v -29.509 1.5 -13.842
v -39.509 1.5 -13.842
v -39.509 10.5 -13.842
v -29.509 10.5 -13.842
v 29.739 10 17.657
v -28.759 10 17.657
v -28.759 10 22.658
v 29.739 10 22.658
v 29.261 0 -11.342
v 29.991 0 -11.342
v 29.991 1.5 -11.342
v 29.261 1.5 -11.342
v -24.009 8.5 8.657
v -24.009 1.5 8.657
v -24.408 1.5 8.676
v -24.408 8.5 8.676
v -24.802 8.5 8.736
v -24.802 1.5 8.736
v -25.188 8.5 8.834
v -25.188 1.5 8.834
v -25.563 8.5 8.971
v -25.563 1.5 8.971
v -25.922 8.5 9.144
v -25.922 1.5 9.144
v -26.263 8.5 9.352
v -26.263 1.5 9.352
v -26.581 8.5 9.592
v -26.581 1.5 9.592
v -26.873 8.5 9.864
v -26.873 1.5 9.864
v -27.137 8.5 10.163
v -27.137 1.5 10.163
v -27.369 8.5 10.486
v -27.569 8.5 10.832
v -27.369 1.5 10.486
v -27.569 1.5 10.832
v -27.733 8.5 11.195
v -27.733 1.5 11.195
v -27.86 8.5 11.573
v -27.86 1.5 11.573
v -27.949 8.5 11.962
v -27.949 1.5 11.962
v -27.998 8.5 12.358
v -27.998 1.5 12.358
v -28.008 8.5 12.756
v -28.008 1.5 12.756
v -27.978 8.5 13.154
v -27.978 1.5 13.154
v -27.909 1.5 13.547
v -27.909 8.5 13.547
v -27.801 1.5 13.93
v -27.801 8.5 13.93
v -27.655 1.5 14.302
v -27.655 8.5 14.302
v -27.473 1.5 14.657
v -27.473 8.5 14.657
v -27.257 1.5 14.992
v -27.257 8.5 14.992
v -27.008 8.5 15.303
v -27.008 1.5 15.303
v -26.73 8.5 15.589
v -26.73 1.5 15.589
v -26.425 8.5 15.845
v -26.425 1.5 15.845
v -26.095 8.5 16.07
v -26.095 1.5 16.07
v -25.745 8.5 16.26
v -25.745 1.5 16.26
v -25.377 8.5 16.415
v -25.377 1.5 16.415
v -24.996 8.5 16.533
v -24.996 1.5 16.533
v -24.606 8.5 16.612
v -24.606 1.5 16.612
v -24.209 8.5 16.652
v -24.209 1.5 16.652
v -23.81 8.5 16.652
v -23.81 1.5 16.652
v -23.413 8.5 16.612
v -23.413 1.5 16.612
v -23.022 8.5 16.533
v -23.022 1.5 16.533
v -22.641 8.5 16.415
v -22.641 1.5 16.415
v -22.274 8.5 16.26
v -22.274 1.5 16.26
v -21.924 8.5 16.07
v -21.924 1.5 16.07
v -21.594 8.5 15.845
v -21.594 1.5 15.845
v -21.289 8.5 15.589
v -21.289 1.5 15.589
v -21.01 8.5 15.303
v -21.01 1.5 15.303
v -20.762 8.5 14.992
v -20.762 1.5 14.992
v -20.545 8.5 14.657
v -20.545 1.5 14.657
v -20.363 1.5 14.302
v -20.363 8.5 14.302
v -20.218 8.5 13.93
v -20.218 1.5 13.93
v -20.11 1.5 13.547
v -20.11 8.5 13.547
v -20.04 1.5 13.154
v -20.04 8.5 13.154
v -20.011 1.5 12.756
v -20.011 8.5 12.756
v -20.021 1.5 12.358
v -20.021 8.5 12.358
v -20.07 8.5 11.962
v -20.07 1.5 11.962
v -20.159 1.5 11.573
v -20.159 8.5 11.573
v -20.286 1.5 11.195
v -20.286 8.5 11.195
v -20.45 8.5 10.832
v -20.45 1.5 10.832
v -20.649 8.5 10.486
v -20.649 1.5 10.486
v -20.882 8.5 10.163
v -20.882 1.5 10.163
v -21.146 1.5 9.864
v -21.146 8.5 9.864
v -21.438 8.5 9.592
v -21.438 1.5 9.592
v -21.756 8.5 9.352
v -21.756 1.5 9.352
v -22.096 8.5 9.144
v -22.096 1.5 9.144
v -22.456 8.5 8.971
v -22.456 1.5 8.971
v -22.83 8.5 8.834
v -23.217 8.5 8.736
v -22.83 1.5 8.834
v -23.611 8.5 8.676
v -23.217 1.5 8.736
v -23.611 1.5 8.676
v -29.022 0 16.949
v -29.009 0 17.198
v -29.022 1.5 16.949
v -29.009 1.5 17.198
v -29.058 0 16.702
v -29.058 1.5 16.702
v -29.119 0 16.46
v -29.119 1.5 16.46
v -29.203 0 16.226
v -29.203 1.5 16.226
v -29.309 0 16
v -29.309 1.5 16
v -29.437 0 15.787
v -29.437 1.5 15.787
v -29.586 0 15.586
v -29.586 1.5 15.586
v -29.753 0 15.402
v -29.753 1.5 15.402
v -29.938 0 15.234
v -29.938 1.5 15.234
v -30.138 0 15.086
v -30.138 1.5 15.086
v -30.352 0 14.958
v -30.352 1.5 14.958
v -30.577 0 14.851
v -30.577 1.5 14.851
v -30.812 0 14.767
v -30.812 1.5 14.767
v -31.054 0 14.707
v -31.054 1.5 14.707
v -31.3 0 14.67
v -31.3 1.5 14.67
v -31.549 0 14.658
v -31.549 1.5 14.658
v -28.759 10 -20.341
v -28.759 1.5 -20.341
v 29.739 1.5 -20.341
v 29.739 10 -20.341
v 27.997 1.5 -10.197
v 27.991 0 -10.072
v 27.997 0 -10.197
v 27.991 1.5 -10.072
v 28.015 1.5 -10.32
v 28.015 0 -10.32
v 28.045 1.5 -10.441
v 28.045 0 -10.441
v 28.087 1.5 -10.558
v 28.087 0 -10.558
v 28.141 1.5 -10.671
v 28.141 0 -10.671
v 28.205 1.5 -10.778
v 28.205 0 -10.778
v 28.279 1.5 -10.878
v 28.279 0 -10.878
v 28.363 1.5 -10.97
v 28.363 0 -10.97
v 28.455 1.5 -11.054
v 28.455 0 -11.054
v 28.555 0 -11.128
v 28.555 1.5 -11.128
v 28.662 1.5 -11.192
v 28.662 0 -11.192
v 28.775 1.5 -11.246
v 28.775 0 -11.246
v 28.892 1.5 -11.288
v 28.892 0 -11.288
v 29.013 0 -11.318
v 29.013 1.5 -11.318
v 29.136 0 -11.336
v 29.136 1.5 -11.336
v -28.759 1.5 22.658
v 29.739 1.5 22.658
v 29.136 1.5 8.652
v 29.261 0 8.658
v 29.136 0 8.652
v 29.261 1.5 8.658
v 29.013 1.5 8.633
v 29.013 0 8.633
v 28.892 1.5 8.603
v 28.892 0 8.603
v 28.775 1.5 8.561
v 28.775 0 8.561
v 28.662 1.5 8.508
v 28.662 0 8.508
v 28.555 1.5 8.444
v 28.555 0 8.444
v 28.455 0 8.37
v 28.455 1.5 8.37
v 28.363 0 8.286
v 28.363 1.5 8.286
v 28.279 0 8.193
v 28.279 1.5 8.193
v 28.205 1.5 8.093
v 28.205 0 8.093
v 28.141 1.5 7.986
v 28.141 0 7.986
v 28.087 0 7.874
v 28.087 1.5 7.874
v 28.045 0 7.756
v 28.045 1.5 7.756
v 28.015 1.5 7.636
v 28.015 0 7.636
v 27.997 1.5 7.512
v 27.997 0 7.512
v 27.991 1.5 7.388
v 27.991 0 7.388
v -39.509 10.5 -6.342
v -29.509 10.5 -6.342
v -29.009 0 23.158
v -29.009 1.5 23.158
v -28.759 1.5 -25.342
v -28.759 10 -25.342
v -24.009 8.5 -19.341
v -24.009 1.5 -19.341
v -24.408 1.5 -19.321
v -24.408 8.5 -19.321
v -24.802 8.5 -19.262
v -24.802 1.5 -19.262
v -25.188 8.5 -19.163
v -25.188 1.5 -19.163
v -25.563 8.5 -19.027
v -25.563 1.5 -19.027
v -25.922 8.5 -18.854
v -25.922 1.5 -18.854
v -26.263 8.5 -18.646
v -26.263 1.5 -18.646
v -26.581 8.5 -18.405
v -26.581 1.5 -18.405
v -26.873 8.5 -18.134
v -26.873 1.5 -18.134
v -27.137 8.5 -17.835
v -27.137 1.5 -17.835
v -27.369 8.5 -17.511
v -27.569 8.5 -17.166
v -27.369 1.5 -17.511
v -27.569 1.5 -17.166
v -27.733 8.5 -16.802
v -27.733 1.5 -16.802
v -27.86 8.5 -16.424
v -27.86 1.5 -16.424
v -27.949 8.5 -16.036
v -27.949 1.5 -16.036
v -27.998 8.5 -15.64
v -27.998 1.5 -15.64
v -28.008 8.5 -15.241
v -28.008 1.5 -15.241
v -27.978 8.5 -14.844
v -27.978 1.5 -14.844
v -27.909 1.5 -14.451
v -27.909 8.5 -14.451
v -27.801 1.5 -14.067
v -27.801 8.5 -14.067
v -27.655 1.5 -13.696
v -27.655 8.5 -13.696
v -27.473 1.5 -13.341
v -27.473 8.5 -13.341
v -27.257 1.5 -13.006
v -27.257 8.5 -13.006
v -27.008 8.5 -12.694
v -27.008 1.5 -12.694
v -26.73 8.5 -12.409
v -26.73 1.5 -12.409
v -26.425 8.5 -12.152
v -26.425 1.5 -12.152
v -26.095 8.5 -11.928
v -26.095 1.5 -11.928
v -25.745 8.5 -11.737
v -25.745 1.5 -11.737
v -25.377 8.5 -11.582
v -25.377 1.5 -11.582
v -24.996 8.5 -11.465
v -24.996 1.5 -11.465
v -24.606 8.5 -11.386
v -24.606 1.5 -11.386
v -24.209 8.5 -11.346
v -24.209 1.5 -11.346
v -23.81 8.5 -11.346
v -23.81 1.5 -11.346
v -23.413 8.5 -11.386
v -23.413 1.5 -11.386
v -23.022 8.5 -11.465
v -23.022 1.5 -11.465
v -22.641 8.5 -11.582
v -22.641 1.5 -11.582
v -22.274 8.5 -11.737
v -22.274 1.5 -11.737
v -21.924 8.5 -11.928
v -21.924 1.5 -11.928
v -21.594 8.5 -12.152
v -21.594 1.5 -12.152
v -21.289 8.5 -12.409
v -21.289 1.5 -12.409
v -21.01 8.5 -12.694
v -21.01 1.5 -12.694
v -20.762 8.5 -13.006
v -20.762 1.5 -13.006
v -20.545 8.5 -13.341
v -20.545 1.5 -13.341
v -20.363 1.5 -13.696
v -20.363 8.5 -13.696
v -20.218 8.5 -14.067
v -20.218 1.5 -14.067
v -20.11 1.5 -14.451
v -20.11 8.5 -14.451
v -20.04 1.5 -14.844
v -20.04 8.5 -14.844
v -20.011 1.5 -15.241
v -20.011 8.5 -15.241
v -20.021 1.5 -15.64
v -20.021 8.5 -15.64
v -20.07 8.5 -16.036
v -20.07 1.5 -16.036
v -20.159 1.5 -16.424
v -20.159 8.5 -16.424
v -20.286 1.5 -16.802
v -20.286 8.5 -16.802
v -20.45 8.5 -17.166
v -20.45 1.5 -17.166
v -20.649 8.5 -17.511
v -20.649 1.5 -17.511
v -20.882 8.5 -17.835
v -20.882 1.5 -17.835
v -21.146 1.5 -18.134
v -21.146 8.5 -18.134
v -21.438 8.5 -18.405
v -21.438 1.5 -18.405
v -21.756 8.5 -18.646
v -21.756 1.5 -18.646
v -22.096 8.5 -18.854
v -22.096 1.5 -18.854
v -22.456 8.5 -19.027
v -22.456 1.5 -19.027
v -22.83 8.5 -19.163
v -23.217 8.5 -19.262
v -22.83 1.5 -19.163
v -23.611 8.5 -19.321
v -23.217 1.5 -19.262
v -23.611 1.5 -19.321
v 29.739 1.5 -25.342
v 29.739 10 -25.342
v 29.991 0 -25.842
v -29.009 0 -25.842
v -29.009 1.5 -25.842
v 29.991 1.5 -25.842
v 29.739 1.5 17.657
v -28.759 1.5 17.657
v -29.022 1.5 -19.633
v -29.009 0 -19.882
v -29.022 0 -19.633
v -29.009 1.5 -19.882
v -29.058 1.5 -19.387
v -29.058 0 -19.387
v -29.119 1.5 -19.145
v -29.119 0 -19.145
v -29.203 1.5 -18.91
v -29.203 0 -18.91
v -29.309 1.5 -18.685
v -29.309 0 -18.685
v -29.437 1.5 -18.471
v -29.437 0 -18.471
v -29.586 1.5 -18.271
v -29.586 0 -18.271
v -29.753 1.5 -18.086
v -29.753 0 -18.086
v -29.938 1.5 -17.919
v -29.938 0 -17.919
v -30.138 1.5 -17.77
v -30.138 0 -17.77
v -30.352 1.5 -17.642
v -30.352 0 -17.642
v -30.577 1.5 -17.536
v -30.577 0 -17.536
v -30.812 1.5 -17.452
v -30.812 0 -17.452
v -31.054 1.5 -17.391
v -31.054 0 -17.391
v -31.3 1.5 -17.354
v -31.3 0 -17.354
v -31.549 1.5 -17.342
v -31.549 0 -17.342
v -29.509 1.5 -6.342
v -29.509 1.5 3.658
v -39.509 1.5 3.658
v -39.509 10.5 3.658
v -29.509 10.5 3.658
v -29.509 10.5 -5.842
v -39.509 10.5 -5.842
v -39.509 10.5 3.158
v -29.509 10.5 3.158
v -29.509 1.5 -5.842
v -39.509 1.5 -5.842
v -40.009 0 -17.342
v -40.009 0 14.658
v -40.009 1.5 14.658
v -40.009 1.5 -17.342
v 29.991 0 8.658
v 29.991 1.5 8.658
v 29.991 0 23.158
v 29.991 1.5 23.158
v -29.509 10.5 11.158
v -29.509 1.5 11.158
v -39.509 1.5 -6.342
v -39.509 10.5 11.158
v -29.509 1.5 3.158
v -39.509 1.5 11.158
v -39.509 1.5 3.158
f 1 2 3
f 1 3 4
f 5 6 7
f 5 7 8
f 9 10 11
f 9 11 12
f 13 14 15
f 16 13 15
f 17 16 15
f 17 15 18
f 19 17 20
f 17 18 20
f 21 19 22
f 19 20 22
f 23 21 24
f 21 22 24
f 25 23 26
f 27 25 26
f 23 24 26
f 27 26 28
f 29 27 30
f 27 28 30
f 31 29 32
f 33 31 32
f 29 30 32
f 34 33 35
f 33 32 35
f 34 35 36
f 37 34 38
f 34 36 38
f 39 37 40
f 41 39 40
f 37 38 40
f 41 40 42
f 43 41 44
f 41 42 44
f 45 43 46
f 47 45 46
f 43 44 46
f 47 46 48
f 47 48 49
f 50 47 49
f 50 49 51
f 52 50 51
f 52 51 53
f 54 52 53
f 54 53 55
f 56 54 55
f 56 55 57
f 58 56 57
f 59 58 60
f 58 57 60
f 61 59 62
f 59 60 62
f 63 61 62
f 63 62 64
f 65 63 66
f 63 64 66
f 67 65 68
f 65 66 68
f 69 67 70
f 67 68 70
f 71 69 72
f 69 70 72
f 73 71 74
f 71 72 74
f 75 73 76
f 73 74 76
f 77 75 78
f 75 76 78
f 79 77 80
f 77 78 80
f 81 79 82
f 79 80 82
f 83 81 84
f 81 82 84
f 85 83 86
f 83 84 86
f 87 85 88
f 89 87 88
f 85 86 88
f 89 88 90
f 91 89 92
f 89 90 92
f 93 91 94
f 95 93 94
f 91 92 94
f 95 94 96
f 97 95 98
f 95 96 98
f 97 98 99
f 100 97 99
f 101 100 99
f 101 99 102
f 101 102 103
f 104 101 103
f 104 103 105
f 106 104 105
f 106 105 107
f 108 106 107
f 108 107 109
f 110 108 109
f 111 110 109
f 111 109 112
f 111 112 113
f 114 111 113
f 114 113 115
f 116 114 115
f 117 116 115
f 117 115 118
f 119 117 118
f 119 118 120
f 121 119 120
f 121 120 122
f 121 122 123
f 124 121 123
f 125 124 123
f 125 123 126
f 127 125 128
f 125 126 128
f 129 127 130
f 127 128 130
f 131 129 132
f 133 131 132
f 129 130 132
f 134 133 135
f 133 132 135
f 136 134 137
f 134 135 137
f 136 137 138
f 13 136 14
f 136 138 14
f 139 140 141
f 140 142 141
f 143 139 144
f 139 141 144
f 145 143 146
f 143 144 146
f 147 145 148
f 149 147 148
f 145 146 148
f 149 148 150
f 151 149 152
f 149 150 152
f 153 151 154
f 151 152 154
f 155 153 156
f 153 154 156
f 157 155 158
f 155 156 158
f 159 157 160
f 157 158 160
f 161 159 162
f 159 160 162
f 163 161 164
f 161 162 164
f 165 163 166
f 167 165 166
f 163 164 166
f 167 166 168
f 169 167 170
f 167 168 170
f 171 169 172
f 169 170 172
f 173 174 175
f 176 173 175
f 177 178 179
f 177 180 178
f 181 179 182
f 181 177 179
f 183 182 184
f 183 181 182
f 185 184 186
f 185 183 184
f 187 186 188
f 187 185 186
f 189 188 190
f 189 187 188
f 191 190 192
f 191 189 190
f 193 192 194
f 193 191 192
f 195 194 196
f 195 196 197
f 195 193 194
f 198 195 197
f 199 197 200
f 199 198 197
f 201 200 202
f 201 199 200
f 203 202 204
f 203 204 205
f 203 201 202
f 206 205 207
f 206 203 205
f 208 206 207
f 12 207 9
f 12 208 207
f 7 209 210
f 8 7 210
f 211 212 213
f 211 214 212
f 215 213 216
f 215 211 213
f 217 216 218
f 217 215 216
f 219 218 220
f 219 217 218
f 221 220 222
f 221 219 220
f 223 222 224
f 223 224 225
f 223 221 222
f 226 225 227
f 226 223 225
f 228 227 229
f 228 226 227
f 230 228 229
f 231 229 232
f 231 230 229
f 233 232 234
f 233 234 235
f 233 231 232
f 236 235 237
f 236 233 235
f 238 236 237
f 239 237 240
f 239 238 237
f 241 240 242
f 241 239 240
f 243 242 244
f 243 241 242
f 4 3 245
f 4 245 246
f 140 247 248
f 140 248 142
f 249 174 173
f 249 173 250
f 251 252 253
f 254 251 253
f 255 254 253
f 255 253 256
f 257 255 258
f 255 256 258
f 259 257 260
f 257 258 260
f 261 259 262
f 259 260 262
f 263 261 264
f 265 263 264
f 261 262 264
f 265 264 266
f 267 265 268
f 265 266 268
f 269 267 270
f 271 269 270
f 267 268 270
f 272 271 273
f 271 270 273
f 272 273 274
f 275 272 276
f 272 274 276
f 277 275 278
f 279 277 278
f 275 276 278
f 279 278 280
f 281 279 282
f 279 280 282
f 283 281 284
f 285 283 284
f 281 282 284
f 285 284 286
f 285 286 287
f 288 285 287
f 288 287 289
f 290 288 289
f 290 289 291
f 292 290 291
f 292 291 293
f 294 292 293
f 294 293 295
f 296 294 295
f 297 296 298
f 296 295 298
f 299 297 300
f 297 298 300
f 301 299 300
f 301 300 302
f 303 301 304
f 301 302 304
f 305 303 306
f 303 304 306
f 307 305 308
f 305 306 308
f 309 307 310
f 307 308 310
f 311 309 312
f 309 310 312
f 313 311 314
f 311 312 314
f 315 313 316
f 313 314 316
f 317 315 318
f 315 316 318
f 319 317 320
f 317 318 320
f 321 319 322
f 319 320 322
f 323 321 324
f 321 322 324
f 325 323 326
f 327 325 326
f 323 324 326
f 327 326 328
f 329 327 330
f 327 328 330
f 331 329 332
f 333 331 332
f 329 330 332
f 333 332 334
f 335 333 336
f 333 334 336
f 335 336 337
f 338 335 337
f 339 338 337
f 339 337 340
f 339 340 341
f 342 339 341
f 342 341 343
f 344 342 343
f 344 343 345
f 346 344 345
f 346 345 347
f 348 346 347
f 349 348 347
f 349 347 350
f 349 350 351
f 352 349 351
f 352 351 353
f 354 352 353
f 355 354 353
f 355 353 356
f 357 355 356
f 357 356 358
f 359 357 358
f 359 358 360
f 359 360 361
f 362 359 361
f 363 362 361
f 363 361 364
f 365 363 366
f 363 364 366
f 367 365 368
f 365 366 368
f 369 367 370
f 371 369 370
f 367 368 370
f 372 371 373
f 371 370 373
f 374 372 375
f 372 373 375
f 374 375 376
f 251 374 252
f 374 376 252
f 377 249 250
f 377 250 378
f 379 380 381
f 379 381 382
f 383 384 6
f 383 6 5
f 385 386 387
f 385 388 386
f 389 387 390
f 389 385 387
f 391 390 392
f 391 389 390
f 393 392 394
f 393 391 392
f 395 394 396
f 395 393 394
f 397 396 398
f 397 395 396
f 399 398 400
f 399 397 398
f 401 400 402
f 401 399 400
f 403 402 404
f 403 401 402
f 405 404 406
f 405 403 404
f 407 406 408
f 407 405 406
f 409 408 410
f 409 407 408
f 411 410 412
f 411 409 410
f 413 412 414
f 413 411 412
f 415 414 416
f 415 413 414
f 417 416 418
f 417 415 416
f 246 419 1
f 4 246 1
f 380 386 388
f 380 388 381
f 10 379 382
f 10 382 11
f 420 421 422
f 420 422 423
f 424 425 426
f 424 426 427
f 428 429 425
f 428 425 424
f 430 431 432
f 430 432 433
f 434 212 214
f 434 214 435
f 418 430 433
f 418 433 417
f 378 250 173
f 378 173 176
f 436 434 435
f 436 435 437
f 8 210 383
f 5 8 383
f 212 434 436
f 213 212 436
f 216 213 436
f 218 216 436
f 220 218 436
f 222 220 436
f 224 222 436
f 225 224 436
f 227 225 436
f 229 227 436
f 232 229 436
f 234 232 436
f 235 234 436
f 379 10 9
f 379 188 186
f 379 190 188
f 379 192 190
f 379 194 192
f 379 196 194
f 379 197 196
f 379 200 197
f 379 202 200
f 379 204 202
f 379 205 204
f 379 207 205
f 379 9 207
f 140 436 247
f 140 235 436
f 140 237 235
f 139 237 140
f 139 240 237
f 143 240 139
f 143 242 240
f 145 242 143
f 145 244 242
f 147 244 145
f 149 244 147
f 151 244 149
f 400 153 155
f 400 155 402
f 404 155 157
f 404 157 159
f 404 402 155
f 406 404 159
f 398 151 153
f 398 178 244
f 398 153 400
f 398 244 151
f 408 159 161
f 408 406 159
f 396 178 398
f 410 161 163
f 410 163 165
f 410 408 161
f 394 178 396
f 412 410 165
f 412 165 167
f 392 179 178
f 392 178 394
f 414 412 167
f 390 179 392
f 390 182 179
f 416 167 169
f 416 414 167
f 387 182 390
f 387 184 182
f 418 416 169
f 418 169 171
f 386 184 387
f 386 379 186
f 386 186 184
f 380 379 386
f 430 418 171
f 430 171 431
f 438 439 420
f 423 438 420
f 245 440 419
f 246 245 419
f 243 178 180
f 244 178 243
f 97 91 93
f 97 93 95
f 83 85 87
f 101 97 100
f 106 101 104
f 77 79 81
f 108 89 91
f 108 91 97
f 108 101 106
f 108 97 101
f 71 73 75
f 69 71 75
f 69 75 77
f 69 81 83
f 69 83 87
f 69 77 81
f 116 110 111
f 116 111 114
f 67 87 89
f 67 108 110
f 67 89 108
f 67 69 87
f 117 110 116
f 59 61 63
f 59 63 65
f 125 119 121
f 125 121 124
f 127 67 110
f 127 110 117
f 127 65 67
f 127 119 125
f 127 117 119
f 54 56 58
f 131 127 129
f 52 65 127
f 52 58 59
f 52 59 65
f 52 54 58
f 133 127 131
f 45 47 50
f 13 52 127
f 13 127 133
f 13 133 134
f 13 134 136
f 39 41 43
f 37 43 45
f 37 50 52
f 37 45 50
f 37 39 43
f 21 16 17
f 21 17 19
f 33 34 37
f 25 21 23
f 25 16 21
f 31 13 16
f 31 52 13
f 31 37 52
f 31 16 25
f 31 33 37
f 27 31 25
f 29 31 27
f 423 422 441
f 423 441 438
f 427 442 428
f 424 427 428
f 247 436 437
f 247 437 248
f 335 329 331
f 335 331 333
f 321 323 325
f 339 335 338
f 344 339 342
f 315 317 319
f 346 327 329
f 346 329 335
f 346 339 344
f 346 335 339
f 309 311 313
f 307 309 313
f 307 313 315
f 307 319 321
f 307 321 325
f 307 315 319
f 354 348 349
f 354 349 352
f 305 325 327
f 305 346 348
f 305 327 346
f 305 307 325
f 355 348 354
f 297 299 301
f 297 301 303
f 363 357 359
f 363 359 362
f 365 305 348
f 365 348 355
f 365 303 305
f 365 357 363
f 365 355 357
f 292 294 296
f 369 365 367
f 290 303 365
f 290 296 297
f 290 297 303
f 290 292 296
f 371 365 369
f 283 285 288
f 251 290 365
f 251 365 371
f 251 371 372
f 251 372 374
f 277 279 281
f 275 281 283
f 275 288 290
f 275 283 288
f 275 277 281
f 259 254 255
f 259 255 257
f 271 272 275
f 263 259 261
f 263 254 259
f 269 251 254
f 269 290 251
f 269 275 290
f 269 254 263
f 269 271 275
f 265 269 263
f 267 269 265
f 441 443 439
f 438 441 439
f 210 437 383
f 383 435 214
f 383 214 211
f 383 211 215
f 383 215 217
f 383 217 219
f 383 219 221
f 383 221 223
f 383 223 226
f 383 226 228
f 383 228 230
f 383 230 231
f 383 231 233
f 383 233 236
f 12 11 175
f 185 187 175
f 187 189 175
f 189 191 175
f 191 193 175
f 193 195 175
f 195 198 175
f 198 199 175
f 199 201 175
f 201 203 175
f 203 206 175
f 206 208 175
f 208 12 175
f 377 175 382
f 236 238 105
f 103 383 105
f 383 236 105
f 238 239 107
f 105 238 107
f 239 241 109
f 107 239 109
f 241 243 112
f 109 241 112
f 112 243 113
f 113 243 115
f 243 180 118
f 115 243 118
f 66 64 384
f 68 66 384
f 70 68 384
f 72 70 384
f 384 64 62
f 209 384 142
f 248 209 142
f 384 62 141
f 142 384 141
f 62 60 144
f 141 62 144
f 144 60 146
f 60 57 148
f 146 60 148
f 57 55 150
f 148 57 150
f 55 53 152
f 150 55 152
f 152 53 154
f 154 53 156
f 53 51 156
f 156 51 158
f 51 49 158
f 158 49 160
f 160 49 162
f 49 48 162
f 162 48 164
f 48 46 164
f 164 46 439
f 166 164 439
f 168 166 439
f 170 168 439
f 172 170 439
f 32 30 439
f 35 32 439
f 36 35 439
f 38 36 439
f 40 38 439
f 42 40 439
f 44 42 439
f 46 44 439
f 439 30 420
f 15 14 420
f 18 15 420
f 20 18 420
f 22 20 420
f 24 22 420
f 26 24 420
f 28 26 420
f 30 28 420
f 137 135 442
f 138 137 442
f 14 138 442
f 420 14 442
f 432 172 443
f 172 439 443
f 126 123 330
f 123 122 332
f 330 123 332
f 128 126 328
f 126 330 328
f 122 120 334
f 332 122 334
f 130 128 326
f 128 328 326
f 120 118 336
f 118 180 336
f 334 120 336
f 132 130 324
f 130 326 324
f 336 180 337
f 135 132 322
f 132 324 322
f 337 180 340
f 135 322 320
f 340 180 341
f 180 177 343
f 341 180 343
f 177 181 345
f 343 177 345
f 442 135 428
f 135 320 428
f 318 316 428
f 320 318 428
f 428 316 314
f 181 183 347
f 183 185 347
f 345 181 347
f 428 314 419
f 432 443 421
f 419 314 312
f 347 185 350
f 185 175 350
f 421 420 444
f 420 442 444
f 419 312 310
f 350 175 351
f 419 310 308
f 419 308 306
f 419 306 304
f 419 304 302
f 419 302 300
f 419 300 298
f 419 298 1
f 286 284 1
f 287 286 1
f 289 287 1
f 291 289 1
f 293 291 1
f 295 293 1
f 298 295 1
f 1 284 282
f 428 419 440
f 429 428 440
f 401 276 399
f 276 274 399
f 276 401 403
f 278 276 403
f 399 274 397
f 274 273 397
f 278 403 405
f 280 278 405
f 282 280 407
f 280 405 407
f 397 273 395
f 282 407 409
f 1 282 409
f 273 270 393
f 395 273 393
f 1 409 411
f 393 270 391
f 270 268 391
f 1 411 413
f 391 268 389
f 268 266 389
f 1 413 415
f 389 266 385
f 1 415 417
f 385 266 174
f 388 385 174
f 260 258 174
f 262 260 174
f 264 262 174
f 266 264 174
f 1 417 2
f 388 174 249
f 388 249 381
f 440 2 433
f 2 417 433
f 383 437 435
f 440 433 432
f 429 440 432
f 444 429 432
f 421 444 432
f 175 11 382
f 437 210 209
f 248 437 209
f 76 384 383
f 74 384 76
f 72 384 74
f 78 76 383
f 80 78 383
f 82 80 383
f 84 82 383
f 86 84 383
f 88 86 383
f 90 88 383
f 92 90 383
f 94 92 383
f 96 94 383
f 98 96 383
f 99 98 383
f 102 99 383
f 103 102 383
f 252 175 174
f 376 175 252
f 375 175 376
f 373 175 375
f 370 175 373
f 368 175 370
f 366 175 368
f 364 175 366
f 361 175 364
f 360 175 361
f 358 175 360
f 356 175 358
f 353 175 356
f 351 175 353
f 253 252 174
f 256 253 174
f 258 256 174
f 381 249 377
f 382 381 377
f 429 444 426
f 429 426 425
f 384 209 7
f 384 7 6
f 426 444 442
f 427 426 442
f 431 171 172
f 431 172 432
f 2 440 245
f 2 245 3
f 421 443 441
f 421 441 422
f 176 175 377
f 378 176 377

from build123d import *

# Parameters (mm, degrees)
BOSS_EXTRUDE1_DEPTH = 1.5
SKETCH2_W           = 58.49874
SKETCH2_H           = 5.00126
BOSS_EXTRUDE2_DEPTH = 8.5
SKETCH3_W           = 10
SKETCH3_H           = 7.5
SKETCH3_H_2         = 9
BOSS_EXTRUDE3_DEPTH = 9
SKETCH4_R           = 4
BOSS_EXTRUDE4_DEPTH = 7
FILLET1_R           = 2.54
FILLET2_R           = 1.27


with BuildPart() as part:
    # Sketch1 → Boss-Extrude1 (new body)
    with BuildSketch(Plane(origin=(0, 0, 0), x_dir=(1, 0, 0), z_dir=(0, 1, 0))):
        Polygon((-29.009375, 25.8421875), (29.990625, 25.8421875), (29.990625, 11.3421875), (27.990625, 11.3421875), (27.990625, -8.6578125), (29.990625, -8.6578125), (29.990625, -23.1578125), (-29.009375, -23.1578125), (-29.009375, -14.6578125), (-40.009375, -14.6578125), (-40.009375, 17.3421875), (-29.009375, 17.3421875), align=None)
    extrude(amount=BOSS_EXTRUDE1_DEPTH)

    # Sketch2 → Boss-Extrude2 (add)
    with BuildSketch(Plane(origin=(0, 1.5, 0), x_dir=(1, 0, 0), z_dir=(0, 1, 0))):
        with Locations((0.489995, -20.1571825)):
            Rectangle(SKETCH2_W, SKETCH2_H)
        with Locations((0.489995, 22.8415575)):
            Rectangle(SKETCH2_W, SKETCH2_H)
    extrude(amount=BOSS_EXTRUDE2_DEPTH)

    # Sketch3 → Boss-Extrude3 (add)
    with BuildSketch(Plane(origin=(0, 1.5, 0), x_dir=(1, 0, 0), z_dir=(0, 1, 0))):
        with Locations((-34.509375, 10.0921875)):
            Rectangle(SKETCH3_W, SKETCH3_H)
        with Locations((-34.509375, 1.3421875)):
            Rectangle(SKETCH3_W, SKETCH3_H_2)
        with Locations((-34.509375, -7.4078125)):
            Rectangle(SKETCH3_W, SKETCH3_H)
    extrude(amount=BOSS_EXTRUDE3_DEPTH)

    # Sketch4 → Boss-Extrude4 (add)
    with BuildSketch(Plane(origin=(0, 1.5, 0), x_dir=(1, 0, 0), z_dir=(0, 1, 0))):
        with Locations(Location((-24.009375, 15.3409275, 0), (0, 0, 90))):
            Circle(SKETCH4_R)
        with Locations(Location((-24.009375, -12.6565525, 0), (0, 0, 90))):
            Circle(SKETCH4_R)
    extrude(amount=BOSS_EXTRUDE4_DEPTH)

    # Fillet1
    fillet1_edges = [part.edges().sort_by_distance(p)[0] for p in [
        (-29.009375, 0.75, 14.6578125),
        (-29.009375, 0.75, -17.3421875),
    ]]
    fillet(fillet1_edges, radius=FILLET1_R)

    # Fillet2
    fillet2_edges = [part.edges().sort_by_distance(p)[0] for p in [
        (27.990625, 0.75, -11.3421875),
        (27.990625, 0.75, 8.6578125),
    ]]
    fillet(fillet2_edges, radius=FILLET2_R)


solid = part.part
